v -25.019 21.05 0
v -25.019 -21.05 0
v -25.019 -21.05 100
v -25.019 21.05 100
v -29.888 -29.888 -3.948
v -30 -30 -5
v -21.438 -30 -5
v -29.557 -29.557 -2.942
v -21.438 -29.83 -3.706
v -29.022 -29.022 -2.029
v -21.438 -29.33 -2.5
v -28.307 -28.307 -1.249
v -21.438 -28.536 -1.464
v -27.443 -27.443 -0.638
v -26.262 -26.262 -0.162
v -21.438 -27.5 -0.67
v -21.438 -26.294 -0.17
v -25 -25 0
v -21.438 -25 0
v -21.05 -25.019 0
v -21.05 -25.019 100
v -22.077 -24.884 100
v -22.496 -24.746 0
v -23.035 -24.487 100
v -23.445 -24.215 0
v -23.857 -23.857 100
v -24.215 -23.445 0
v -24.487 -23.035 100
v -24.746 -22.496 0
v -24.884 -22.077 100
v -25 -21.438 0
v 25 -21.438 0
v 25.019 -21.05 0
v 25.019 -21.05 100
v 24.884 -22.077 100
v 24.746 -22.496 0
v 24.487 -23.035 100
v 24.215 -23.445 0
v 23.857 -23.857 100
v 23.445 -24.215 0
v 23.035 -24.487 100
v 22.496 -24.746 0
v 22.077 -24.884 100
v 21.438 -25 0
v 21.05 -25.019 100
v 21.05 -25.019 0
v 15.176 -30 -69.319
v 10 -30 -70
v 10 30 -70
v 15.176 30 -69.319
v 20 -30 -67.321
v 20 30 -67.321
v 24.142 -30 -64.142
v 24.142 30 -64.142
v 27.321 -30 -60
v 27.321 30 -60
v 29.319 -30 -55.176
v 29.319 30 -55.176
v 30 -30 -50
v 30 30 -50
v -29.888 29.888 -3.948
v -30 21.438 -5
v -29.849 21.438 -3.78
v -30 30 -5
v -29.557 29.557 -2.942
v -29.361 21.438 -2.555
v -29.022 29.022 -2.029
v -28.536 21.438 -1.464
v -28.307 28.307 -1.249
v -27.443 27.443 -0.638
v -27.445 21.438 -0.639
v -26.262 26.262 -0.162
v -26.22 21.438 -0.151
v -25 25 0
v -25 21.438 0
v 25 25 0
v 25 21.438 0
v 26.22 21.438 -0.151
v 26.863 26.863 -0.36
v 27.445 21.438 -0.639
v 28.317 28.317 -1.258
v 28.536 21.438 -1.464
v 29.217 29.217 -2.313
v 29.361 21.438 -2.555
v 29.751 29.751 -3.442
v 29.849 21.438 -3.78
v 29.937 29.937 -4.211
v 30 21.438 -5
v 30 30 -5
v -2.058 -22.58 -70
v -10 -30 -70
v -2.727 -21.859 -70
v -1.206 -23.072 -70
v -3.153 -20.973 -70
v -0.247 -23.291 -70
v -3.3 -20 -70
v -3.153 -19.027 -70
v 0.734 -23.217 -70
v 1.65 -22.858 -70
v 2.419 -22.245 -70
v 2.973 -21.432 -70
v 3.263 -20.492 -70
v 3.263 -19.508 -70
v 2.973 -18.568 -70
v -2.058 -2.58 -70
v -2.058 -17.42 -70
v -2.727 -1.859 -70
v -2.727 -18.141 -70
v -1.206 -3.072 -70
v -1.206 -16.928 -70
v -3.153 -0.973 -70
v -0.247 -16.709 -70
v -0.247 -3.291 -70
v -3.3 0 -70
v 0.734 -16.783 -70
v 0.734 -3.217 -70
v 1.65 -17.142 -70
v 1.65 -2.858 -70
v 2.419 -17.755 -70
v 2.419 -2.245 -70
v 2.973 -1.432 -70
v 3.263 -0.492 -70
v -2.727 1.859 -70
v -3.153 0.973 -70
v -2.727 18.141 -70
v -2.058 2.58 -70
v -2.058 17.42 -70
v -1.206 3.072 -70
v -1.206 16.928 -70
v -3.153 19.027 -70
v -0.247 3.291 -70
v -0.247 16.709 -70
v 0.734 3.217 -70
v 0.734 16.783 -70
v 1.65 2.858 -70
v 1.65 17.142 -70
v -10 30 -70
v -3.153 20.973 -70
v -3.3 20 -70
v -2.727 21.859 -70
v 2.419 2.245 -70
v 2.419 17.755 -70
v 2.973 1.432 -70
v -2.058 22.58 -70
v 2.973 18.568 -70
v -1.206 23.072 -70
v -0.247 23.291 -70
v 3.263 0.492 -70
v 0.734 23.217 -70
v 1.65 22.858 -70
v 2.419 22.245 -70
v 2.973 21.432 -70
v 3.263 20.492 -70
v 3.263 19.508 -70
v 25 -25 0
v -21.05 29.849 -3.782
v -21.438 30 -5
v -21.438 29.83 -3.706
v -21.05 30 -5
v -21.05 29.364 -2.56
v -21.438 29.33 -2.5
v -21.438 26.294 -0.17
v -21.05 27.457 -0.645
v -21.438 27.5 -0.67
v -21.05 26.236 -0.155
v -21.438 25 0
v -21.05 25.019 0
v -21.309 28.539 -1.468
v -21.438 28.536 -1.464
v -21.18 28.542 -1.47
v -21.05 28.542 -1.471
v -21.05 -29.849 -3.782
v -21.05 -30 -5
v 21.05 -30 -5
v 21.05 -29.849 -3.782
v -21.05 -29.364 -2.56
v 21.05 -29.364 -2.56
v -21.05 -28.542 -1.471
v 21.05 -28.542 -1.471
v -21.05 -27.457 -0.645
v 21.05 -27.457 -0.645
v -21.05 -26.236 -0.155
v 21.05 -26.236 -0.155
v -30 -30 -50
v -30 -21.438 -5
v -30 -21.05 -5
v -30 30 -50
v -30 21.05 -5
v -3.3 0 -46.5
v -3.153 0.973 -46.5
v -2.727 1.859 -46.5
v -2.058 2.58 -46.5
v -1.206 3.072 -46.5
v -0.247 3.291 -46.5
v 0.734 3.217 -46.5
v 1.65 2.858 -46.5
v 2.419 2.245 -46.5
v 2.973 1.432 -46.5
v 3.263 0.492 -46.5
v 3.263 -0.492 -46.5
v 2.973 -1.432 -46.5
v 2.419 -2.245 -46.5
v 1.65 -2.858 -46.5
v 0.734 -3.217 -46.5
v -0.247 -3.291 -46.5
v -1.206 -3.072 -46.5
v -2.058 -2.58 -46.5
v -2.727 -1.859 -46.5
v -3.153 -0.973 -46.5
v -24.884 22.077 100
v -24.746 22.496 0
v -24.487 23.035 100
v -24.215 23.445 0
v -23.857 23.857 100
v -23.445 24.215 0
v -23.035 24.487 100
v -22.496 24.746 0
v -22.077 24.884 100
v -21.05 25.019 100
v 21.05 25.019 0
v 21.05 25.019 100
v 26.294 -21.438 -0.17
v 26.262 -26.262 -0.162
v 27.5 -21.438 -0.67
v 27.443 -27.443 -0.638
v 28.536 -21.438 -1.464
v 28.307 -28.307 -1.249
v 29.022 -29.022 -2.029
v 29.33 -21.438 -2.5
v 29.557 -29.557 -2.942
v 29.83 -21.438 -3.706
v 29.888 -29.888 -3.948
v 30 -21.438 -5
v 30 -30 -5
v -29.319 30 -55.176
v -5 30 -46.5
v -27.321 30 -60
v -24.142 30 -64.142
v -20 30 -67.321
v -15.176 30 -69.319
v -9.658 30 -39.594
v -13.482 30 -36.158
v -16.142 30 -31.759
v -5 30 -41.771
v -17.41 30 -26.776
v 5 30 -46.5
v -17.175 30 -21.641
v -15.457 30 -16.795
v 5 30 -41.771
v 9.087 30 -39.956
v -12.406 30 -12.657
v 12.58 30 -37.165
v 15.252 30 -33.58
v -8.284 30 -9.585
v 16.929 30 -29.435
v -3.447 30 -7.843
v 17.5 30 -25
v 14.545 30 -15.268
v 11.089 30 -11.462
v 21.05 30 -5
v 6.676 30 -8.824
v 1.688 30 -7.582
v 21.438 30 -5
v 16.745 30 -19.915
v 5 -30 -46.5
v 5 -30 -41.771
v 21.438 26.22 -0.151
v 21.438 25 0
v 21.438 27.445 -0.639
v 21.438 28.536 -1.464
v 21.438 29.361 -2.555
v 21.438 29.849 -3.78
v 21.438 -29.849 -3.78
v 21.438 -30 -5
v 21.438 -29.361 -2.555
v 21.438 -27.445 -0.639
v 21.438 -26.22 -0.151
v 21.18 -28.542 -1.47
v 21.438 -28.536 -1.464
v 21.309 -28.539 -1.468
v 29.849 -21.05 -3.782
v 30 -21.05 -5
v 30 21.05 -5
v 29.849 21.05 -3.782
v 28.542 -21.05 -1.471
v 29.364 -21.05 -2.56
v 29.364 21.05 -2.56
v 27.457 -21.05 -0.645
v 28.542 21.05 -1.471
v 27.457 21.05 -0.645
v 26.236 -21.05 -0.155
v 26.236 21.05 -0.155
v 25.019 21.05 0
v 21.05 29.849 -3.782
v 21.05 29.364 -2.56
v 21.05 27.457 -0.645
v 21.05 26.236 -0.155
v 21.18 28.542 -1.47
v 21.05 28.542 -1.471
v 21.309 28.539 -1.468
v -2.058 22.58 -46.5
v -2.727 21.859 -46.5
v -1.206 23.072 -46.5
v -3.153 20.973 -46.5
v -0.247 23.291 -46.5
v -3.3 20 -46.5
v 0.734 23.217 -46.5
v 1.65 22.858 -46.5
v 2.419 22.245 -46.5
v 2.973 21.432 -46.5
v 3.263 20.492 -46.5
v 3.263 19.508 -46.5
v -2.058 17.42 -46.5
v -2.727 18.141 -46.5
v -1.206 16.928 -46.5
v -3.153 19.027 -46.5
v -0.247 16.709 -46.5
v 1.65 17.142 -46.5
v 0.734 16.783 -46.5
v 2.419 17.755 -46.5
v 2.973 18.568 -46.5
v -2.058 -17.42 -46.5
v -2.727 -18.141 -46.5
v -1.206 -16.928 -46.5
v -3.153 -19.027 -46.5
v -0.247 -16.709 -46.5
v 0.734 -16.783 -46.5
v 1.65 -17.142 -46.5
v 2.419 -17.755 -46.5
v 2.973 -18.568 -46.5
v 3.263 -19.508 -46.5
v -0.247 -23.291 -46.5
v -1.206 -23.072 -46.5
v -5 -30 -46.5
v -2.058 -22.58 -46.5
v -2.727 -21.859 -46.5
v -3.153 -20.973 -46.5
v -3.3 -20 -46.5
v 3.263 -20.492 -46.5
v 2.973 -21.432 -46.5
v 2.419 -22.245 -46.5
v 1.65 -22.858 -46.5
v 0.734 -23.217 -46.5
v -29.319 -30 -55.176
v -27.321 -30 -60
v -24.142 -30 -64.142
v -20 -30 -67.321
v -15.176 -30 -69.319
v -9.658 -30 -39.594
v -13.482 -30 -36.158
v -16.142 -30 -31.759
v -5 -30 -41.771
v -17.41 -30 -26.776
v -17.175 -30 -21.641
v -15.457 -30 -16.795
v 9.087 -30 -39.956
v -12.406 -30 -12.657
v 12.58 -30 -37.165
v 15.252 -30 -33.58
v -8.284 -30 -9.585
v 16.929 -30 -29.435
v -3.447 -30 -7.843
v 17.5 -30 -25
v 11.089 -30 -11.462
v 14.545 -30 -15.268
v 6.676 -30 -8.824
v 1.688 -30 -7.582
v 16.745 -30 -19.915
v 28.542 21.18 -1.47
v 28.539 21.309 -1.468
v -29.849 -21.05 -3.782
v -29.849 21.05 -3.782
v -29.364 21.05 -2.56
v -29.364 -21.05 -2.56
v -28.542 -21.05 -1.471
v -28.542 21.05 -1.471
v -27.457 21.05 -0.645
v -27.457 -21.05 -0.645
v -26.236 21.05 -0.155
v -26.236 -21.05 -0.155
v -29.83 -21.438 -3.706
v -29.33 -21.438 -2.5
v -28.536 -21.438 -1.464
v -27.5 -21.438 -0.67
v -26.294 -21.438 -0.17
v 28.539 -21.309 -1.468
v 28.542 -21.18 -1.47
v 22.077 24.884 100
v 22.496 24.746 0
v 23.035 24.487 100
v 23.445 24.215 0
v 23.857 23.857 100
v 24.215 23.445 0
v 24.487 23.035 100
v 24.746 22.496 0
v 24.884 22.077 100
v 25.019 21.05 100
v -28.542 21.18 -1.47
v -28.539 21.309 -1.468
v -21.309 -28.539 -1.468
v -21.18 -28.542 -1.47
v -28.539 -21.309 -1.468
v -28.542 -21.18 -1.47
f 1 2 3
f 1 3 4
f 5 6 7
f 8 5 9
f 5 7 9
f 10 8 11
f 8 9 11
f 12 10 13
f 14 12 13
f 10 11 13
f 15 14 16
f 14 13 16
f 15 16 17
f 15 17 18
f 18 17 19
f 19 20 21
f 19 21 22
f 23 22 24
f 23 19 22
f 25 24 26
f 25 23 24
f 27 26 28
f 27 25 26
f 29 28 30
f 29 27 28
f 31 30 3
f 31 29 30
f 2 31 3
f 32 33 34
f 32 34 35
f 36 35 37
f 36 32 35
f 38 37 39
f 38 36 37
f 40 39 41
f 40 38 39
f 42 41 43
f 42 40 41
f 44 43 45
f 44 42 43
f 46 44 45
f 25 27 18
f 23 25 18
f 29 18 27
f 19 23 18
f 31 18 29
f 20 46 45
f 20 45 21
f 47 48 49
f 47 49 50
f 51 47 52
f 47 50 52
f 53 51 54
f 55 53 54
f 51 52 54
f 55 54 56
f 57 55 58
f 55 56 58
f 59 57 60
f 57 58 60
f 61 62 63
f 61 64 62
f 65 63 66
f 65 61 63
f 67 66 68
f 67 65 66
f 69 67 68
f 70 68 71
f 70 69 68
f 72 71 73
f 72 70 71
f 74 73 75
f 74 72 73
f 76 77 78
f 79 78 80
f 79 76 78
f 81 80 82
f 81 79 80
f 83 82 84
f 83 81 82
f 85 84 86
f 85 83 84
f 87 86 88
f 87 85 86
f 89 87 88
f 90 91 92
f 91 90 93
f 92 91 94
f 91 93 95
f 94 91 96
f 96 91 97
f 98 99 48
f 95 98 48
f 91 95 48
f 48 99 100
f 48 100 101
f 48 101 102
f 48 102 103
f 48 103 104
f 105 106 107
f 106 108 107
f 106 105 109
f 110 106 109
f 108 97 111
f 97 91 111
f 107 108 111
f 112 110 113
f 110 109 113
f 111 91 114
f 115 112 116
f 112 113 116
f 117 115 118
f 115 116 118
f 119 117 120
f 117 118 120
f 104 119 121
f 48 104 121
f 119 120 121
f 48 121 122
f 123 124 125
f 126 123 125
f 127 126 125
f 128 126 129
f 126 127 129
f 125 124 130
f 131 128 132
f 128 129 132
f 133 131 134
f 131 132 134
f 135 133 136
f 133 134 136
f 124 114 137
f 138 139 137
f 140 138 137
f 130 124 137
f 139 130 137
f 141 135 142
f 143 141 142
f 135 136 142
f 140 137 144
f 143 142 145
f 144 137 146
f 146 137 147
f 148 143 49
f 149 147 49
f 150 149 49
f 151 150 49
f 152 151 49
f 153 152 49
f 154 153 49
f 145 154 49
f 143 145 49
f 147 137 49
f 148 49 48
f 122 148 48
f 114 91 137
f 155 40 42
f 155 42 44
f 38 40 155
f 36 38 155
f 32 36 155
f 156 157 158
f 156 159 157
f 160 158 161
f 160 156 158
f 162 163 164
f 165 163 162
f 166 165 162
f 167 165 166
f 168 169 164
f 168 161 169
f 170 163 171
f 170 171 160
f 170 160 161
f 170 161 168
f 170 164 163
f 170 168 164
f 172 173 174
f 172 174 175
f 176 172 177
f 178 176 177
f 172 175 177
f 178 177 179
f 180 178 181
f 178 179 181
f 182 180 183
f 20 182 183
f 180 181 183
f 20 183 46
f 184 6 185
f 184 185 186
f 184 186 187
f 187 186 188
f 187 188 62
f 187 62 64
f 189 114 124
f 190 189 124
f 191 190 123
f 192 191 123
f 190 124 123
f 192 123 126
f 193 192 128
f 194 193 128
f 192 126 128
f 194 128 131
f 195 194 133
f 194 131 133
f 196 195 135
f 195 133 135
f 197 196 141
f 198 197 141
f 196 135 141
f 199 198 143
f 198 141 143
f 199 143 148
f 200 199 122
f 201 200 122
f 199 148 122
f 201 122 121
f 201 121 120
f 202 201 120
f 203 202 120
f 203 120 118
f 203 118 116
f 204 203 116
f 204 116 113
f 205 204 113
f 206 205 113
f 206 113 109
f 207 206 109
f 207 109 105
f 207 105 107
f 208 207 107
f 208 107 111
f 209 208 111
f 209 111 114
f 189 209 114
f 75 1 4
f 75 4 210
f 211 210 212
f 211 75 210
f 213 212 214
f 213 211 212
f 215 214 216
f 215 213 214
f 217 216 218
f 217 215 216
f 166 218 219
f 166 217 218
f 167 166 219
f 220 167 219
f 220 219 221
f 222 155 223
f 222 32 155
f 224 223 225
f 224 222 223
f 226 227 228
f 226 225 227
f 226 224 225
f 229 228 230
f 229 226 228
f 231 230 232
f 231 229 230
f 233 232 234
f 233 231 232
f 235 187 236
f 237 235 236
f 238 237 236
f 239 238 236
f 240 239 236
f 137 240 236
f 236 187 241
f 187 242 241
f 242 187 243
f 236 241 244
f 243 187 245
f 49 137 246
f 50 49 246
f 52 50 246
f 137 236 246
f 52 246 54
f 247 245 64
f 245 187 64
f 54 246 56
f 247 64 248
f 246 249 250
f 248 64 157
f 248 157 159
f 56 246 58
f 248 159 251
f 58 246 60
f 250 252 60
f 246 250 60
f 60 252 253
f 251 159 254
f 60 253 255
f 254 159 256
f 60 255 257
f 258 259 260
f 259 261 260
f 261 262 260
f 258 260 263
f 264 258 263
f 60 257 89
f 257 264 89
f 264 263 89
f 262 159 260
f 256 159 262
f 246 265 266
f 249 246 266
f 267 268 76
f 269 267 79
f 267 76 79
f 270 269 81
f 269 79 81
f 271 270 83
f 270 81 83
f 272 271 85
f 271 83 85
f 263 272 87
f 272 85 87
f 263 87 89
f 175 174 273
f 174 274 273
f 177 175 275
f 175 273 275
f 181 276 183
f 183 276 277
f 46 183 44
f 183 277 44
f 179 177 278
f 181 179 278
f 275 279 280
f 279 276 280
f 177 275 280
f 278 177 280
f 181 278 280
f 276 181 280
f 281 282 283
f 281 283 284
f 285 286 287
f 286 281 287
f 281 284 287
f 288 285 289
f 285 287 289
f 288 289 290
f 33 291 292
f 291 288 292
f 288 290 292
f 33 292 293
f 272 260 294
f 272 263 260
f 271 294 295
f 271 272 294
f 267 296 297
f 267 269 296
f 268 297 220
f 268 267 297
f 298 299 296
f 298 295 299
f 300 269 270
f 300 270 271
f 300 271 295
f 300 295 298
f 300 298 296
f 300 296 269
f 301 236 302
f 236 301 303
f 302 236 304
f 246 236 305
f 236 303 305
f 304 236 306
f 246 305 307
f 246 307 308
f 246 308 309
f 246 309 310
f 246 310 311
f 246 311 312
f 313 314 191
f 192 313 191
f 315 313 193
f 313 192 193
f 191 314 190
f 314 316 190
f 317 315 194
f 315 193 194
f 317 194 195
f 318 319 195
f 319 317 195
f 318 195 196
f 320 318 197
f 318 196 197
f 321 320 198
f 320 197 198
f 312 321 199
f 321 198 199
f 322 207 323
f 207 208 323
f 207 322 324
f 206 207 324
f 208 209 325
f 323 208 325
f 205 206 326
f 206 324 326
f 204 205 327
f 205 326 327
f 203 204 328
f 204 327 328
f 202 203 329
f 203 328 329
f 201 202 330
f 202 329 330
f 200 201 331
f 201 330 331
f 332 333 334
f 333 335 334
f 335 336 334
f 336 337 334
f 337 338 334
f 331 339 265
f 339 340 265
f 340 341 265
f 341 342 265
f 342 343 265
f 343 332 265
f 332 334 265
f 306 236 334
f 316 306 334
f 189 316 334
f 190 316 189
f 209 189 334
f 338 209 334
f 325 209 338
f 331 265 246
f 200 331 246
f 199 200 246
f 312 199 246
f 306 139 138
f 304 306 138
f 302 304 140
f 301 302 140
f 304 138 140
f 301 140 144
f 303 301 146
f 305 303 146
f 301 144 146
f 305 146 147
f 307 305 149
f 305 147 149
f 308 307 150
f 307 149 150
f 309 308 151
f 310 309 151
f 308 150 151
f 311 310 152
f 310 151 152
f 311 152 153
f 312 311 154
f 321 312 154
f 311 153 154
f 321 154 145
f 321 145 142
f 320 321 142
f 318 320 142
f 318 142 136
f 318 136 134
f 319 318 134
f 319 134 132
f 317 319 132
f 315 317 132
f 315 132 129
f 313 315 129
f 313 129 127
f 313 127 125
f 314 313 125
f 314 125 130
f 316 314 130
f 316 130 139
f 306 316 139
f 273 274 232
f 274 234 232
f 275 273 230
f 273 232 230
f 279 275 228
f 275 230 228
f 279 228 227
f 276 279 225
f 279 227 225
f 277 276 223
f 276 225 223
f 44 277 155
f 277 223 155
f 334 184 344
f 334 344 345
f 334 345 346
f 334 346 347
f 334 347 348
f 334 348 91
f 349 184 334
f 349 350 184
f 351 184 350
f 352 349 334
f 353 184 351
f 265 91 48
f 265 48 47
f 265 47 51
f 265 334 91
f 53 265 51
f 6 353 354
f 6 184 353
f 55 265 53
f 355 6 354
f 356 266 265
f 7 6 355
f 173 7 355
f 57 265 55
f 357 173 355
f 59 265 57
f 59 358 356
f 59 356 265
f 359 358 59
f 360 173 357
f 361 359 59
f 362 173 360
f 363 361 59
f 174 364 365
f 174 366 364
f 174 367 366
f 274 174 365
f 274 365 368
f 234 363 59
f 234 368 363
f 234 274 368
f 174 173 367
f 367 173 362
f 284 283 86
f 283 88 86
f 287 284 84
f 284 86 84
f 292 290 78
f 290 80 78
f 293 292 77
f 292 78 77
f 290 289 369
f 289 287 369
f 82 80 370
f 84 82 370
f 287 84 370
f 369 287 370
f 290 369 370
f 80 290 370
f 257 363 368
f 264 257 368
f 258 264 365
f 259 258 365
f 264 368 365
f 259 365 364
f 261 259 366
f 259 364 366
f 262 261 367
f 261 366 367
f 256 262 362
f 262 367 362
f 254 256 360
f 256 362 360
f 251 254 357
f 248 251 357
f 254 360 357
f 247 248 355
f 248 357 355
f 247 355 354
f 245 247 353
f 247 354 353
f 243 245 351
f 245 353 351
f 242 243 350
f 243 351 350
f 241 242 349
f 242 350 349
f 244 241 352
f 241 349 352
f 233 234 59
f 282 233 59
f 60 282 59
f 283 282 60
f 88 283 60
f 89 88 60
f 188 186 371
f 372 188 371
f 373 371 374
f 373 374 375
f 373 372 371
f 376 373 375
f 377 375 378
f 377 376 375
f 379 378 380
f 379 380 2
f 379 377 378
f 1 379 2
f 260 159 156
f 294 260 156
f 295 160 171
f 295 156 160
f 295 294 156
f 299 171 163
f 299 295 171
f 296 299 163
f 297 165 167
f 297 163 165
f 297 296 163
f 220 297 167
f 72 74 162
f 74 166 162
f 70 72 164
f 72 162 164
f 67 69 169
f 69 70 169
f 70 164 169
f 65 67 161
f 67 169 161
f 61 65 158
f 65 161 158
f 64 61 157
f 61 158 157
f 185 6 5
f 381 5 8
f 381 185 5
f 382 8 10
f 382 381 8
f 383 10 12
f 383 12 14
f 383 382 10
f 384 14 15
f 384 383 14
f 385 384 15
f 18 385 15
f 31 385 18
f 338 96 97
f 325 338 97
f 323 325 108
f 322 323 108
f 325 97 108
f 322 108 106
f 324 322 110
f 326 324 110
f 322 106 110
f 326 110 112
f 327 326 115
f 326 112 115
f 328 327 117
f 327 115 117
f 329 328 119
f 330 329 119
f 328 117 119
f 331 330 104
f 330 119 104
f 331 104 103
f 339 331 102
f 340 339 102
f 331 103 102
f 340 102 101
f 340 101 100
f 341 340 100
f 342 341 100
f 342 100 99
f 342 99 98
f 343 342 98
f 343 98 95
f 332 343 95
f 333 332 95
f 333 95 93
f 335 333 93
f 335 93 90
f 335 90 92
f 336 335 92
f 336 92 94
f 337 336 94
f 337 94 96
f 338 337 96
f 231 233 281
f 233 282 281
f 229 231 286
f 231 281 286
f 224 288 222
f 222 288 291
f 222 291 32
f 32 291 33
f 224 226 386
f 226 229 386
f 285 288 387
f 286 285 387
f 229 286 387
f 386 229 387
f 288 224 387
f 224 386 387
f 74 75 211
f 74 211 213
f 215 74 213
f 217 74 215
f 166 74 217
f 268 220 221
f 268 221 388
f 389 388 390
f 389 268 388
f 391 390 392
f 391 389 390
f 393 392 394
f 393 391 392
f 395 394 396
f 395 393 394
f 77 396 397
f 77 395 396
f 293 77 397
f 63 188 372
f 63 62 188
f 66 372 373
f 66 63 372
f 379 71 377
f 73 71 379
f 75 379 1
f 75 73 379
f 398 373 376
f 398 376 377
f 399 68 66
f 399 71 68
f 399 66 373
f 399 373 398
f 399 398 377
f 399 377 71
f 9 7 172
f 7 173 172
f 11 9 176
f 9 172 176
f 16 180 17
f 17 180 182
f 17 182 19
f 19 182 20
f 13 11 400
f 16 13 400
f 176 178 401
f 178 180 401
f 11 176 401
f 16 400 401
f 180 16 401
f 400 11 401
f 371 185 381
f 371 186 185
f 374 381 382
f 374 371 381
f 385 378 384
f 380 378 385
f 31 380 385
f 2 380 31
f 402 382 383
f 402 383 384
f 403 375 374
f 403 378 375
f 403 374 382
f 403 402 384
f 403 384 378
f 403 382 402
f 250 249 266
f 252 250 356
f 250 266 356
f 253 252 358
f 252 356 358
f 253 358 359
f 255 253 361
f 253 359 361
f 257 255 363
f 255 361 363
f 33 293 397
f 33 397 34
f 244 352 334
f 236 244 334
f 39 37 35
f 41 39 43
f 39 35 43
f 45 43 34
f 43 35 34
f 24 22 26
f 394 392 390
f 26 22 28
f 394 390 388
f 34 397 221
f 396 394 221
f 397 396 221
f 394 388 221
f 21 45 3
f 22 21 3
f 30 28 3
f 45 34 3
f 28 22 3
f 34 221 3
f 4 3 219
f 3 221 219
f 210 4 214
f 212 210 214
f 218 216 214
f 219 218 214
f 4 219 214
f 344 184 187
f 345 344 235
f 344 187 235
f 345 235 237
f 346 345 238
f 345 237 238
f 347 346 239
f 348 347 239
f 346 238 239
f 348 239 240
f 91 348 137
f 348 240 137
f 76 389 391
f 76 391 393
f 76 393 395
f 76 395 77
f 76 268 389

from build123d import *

# Parameters (mm, degrees)
BOSS_EXTRUDE1_DEPTH       = 100
SKETCH2_W                 = 60
SKETCH2_H                 = 60
BOSS_EXTRUDE2_DEPTH       = 70
CUT_EXTRUDE2_DEPTH        = 60
CUT_EXTRUDE3_DEPTH        = 60
M6_CLEARANCE_HOLE1_REACH  = 177.214
M6_CLEARANCE_HOLE1_BORE_R = 3.3
FILLET1_R                 = 20
FILLET2_R                 = 5


with BuildPart() as part:
    # Sketch1 → Boss-Extrude1 (new body)
    with BuildSketch(Plane.XY):
        with BuildLine():
            Line((25.019, 21.05025), (25.019, -21.05025))
            ThreePointArc((25.019, -21.05025), (23.856580038, -23.856580038), (21.05025, -25.019))
            Line((21.05025, -25.019), (-21.05025, -25.019))
            ThreePointArc((-21.05025, -25.019), (-23.856580038, -23.856580038), (-25.019, -21.05025))
            Line((-25.019, -21.05025), (-25.019, 21.05025))
            ThreePointArc((-25.019, 21.05025), (-23.856580038, 23.856580038), (-21.05025, 25.019))
            Line((-21.05025, 25.019), (21.05025, 25.019))
            ThreePointArc((21.05025, 25.019), (23.856580038, 23.856580038), (25.019, 21.05025))
        make_face()
    extrude(amount=BOSS_EXTRUDE1_DEPTH)

    # Sketch2 → Boss-Extrude2 (add)
    with BuildSketch(Plane.XY):
        Rectangle(SKETCH2_W, SKETCH2_H)
    extrude(amount=-BOSS_EXTRUDE2_DEPTH)

    # Sketch3 → Cut-Extrude2 (cut)
    with BuildSketch(Plane.XZ.offset(30)):
        with BuildLine():
            ThreePointArc((17.5, -25), (-10.458250332, -10.9687848), (-5, -41.770509831))
            Line((-5, -41.770509831), (-5, -38.5))
            Line((-5, -38.5), (5, -38.5))
            Line((5, -38.5), (5, -41.770509831))
            ThreePointArc((5, -41.770509831), (14.0312152, -35.458250332), (17.5, -25))
        make_face()
        with BuildLine():
            Line((-5, -38.5), (-5, -41.770509831))
            ThreePointArc((-5, -41.770509831), (0, -42.5), (5, -41.770509831))
            Line((5, -41.770509831), (5, -38.5))
            Line((5, -38.5), (-5, -38.5))
        make_face()
    extrude(amount=-CUT_EXTRUDE2_DEPTH, mode=Mode.SUBTRACT)

    # Sketch3<7> → Cut-Extrude3 (cut)
    with BuildSketch(Plane.XZ.offset(30)):
        with BuildLine():
            Line((-5, -41.770509831), (-5, -46.5))
            Line((-5, -46.5), (5, -46.5))
            Line((5, -46.5), (5, -41.770509831))
            ThreePointArc((5, -41.770509831), (0, -42.5), (-5, -41.770509831))
        make_face()
    extrude(amount=-CUT_EXTRUDE3_DEPTH, mode=Mode.SUBTRACT)

    # M6 Clearance Hole1 bore → M6 Clearance Hole1 (cut, up to next)
    with BuildSketch(Plane(origin=(0, 0, -70), x_dir=(-1, 0, 0), z_dir=(0, 0, -1)), mode=Mode.PRIVATE) as m6_clearance_hole1_sk1:
        with Locations((0, 20)):
            Circle(M6_CLEARANCE_HOLE1_BORE_R)
    m6_clearance_hole1_tool1 = extrude(m6_clearance_hole1_sk1.sketch, amount=-M6_CLEARANCE_HOLE1_REACH, mode=Mode.PRIVATE) & part.part
    # M6 Clearance Hole1 bore → M6 Clearance Hole1 (cut, up to next)
    with BuildSketch(Plane(origin=(0, 0, -70), x_dir=(-1, 0, 0), z_dir=(0, 0, -1)), mode=Mode.PRIVATE) as m6_clearance_hole1_sk2:
        Circle(M6_CLEARANCE_HOLE1_BORE_R)
    m6_clearance_hole1_tool2 = extrude(m6_clearance_hole1_sk2.sketch, amount=-M6_CLEARANCE_HOLE1_REACH, mode=Mode.PRIVATE) & part.part
    # M6 Clearance Hole1 bore → M6 Clearance Hole1 (cut, up to next)
    with BuildSketch(Plane(origin=(0, 0, -70), x_dir=(-1, 0, 0), z_dir=(0, 0, -1)), mode=Mode.PRIVATE) as m6_clearance_hole1_sk3:
        with Locations((0, -20)):
            Circle(M6_CLEARANCE_HOLE1_BORE_R)
    m6_clearance_hole1_tool3 = extrude(m6_clearance_hole1_sk3.sketch, amount=-M6_CLEARANCE_HOLE1_REACH, mode=Mode.PRIVATE) & part.part
    add(m6_clearance_hole1_tool1.solids().sort_by_distance((0, 20, -70))[0], mode=Mode.SUBTRACT)
    add(m6_clearance_hole1_tool2.solids().sort_by_distance((0, 0, -70))[0], mode=Mode.SUBTRACT)
    add(m6_clearance_hole1_tool3.solids().sort_by_distance((0, -20, -70))[0], mode=Mode.SUBTRACT)

    # Fillet1
    fillet1_edges = [part.edges().sort_by_distance(p)[0] for p in [
        (-30, 0, -70),
        (30, 0, -70),
    ]]
    fillet(fillet1_edges, radius=FILLET1_R)

    # Fillet2
    fillet2_edges = [part.edges().sort_by_distance(p)[0] for p in [
        (-30, 0, 0),
        (0, -30, 0),
        (30, 0, 0),
        (0, 30, 0),
    ]]
    fillet(fillet2_edges, radius=FILLET2_R)


solid = part.part
